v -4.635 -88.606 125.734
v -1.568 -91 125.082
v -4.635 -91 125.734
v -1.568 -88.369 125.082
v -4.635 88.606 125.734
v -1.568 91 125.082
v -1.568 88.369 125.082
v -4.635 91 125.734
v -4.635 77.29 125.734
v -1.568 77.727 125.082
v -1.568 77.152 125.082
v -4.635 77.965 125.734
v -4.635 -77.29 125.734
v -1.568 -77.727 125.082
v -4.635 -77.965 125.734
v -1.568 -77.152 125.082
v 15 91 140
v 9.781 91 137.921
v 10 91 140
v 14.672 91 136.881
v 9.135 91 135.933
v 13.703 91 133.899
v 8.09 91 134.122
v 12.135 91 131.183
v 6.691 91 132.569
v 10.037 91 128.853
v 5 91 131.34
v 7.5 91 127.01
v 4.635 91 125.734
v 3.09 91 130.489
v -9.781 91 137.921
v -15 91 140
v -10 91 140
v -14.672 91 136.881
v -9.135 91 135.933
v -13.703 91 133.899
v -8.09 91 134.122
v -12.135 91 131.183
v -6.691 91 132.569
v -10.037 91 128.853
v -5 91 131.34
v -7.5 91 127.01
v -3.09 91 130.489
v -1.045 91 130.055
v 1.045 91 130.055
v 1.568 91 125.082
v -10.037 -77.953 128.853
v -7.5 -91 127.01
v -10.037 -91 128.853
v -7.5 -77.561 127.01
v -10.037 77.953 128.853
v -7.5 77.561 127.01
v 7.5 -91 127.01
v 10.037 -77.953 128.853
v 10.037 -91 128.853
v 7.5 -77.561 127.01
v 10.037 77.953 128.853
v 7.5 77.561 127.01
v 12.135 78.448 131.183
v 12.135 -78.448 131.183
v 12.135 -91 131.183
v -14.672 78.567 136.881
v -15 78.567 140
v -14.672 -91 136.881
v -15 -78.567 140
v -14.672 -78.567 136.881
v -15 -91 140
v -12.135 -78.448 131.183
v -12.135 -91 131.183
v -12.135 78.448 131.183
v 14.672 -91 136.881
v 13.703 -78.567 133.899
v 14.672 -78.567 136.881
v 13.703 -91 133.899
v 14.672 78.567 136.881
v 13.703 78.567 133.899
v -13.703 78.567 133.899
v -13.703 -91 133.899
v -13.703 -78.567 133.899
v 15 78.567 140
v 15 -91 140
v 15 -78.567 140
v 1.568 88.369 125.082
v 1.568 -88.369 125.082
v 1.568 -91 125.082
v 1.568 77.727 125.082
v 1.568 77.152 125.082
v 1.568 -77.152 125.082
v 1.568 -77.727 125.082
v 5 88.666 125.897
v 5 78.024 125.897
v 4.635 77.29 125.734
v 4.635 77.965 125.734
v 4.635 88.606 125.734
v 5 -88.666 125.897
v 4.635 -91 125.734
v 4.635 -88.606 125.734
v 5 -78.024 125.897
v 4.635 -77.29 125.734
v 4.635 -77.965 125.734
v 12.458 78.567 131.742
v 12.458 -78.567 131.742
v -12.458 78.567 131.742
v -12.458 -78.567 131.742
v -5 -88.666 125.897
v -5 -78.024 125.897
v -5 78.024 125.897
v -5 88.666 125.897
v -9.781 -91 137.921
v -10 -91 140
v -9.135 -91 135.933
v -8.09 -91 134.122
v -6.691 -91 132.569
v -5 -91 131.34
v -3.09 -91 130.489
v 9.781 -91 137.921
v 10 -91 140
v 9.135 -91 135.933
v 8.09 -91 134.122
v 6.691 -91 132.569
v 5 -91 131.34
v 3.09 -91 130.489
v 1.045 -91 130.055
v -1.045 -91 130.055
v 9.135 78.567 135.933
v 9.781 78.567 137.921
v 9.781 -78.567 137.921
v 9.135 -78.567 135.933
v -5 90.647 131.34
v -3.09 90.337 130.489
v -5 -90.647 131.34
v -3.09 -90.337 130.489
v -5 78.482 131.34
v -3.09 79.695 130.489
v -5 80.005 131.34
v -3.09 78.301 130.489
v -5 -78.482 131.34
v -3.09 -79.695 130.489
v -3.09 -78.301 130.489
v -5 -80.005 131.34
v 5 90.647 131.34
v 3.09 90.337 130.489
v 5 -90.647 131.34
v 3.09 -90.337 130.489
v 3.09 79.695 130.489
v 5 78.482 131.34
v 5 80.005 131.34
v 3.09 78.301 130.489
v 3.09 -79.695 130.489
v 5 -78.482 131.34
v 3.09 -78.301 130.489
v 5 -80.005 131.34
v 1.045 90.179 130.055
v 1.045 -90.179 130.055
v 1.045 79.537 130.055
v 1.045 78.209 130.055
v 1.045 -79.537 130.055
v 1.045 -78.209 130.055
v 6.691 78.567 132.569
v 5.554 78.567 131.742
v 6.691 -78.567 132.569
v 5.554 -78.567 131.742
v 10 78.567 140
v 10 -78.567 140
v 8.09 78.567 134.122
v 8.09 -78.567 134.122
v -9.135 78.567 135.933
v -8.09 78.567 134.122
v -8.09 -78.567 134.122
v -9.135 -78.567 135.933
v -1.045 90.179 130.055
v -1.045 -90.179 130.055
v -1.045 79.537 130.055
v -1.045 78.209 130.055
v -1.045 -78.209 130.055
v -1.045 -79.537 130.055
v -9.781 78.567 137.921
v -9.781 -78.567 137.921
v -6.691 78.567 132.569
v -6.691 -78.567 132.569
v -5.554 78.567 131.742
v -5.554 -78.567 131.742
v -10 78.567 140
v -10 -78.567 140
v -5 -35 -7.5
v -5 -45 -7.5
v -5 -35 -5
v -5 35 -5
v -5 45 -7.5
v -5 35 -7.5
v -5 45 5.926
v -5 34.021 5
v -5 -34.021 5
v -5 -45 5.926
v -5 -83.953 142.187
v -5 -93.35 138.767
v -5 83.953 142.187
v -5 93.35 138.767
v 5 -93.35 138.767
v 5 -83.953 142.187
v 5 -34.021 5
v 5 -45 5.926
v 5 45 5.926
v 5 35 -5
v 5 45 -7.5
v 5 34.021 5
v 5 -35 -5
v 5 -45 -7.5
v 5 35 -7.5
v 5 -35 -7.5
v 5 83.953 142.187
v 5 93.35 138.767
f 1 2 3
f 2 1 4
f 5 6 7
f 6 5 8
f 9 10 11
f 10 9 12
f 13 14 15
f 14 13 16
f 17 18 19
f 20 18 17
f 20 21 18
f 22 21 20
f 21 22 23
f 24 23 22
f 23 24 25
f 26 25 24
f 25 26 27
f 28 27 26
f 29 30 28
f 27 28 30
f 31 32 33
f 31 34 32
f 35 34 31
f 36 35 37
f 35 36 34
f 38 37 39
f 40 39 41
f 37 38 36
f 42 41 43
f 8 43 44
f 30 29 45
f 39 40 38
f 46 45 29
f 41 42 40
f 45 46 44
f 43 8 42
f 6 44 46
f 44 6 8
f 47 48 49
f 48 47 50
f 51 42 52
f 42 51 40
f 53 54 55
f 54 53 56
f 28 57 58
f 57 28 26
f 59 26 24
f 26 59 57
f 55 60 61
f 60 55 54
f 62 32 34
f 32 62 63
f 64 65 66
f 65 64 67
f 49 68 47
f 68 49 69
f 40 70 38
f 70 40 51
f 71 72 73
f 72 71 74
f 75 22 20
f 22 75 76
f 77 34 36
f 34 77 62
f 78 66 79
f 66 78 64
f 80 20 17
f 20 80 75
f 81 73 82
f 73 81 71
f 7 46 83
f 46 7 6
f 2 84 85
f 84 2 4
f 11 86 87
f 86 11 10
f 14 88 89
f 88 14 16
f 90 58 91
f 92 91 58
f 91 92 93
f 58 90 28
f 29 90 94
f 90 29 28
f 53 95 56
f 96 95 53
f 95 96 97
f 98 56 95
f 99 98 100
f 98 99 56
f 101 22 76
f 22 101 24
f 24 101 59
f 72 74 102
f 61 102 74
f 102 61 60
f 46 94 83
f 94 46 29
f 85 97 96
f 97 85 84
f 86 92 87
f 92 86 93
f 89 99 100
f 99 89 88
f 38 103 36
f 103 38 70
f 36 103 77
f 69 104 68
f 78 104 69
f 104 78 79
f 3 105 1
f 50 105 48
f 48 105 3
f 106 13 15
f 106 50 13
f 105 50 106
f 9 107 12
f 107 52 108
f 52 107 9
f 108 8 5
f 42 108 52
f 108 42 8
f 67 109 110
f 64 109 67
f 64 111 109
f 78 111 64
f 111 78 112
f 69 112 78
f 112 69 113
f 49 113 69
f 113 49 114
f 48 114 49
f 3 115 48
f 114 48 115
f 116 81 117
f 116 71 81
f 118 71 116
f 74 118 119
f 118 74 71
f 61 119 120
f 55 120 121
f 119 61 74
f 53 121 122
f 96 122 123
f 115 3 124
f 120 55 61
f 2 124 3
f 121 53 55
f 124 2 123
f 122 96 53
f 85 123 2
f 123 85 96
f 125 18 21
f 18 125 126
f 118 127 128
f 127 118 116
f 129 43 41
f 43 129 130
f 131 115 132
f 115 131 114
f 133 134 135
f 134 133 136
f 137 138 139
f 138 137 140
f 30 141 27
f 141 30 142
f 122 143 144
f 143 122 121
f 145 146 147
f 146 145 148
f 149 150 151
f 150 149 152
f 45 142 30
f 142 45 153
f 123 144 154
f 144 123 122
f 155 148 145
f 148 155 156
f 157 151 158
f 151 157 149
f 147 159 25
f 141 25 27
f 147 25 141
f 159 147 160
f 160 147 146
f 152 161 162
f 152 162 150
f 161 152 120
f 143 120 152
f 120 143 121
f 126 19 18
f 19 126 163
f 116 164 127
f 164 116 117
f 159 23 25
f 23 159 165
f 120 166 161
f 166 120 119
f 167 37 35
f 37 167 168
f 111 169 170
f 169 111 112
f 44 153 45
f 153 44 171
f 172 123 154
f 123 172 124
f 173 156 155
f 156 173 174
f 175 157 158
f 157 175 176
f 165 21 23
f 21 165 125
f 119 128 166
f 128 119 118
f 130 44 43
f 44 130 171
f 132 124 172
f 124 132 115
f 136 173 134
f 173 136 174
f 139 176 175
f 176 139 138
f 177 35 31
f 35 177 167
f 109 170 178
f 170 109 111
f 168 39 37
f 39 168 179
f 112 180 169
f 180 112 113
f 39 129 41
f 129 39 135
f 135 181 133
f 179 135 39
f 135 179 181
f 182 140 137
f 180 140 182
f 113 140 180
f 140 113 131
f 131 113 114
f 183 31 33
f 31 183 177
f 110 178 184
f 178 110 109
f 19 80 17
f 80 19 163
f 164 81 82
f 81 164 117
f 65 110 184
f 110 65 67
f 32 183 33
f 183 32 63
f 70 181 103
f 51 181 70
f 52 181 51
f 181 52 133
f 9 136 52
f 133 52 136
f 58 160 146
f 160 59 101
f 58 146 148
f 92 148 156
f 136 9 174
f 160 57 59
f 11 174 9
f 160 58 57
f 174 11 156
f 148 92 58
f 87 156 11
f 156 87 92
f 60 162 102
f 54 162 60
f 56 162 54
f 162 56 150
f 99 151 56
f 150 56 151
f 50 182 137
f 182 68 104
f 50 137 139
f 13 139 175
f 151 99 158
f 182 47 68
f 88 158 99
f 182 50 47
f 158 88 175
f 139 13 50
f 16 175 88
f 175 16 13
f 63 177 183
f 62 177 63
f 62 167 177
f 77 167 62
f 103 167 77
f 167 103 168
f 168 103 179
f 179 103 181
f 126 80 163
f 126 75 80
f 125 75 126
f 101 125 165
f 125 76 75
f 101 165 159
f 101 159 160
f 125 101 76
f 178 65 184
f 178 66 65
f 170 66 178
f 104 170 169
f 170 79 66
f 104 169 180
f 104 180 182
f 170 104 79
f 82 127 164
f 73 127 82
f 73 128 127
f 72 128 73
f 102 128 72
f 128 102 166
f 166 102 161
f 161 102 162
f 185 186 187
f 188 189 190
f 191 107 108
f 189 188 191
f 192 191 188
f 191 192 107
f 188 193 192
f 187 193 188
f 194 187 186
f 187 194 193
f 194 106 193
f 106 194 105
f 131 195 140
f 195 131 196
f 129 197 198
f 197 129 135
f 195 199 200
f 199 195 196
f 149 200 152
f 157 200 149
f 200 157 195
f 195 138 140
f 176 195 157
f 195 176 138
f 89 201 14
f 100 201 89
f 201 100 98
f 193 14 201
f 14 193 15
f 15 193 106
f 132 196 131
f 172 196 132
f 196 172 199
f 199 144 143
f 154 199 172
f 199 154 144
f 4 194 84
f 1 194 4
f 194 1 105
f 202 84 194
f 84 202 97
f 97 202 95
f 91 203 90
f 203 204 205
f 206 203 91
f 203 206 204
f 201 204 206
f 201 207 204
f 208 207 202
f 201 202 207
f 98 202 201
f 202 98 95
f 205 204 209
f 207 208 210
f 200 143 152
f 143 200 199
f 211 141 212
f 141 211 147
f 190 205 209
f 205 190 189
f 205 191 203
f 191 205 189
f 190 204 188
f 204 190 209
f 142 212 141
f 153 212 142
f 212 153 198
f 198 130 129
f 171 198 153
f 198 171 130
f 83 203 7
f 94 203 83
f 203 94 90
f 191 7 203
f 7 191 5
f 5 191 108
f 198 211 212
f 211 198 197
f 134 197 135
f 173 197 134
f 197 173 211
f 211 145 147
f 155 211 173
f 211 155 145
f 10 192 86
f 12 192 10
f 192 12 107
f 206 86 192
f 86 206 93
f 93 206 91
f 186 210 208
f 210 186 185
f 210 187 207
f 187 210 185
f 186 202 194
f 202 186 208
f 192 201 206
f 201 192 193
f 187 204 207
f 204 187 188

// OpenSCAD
translate([0,-63,70])rotate([20,0,0]){
    cube([10,10,150], center=true);
}
translate([0,40,0]){
    cube([10,10,15], center=true);
}
translate([0,63,70])rotate([-20,0,0]){
    cube([10,10,150], center=true);
}
translate([0,-40,0]){
    cube([10,10,15], center=true);
}
cube([10,70,10], center=true);
difference(){
translate([0,0,140])rotate([90,0,0])cylinder(h=182,d=30, center=true);
translate([0,0,140])rotate([90,0,0])cylinder(h=200,d=20, center=true);
    translate([0,0,190])rotate([90,0,0])cube([40,100,220], center=true);
    translate([0,0,140])rotate([0,90,0])cylinder(h=40,d=158, center=true);
}
